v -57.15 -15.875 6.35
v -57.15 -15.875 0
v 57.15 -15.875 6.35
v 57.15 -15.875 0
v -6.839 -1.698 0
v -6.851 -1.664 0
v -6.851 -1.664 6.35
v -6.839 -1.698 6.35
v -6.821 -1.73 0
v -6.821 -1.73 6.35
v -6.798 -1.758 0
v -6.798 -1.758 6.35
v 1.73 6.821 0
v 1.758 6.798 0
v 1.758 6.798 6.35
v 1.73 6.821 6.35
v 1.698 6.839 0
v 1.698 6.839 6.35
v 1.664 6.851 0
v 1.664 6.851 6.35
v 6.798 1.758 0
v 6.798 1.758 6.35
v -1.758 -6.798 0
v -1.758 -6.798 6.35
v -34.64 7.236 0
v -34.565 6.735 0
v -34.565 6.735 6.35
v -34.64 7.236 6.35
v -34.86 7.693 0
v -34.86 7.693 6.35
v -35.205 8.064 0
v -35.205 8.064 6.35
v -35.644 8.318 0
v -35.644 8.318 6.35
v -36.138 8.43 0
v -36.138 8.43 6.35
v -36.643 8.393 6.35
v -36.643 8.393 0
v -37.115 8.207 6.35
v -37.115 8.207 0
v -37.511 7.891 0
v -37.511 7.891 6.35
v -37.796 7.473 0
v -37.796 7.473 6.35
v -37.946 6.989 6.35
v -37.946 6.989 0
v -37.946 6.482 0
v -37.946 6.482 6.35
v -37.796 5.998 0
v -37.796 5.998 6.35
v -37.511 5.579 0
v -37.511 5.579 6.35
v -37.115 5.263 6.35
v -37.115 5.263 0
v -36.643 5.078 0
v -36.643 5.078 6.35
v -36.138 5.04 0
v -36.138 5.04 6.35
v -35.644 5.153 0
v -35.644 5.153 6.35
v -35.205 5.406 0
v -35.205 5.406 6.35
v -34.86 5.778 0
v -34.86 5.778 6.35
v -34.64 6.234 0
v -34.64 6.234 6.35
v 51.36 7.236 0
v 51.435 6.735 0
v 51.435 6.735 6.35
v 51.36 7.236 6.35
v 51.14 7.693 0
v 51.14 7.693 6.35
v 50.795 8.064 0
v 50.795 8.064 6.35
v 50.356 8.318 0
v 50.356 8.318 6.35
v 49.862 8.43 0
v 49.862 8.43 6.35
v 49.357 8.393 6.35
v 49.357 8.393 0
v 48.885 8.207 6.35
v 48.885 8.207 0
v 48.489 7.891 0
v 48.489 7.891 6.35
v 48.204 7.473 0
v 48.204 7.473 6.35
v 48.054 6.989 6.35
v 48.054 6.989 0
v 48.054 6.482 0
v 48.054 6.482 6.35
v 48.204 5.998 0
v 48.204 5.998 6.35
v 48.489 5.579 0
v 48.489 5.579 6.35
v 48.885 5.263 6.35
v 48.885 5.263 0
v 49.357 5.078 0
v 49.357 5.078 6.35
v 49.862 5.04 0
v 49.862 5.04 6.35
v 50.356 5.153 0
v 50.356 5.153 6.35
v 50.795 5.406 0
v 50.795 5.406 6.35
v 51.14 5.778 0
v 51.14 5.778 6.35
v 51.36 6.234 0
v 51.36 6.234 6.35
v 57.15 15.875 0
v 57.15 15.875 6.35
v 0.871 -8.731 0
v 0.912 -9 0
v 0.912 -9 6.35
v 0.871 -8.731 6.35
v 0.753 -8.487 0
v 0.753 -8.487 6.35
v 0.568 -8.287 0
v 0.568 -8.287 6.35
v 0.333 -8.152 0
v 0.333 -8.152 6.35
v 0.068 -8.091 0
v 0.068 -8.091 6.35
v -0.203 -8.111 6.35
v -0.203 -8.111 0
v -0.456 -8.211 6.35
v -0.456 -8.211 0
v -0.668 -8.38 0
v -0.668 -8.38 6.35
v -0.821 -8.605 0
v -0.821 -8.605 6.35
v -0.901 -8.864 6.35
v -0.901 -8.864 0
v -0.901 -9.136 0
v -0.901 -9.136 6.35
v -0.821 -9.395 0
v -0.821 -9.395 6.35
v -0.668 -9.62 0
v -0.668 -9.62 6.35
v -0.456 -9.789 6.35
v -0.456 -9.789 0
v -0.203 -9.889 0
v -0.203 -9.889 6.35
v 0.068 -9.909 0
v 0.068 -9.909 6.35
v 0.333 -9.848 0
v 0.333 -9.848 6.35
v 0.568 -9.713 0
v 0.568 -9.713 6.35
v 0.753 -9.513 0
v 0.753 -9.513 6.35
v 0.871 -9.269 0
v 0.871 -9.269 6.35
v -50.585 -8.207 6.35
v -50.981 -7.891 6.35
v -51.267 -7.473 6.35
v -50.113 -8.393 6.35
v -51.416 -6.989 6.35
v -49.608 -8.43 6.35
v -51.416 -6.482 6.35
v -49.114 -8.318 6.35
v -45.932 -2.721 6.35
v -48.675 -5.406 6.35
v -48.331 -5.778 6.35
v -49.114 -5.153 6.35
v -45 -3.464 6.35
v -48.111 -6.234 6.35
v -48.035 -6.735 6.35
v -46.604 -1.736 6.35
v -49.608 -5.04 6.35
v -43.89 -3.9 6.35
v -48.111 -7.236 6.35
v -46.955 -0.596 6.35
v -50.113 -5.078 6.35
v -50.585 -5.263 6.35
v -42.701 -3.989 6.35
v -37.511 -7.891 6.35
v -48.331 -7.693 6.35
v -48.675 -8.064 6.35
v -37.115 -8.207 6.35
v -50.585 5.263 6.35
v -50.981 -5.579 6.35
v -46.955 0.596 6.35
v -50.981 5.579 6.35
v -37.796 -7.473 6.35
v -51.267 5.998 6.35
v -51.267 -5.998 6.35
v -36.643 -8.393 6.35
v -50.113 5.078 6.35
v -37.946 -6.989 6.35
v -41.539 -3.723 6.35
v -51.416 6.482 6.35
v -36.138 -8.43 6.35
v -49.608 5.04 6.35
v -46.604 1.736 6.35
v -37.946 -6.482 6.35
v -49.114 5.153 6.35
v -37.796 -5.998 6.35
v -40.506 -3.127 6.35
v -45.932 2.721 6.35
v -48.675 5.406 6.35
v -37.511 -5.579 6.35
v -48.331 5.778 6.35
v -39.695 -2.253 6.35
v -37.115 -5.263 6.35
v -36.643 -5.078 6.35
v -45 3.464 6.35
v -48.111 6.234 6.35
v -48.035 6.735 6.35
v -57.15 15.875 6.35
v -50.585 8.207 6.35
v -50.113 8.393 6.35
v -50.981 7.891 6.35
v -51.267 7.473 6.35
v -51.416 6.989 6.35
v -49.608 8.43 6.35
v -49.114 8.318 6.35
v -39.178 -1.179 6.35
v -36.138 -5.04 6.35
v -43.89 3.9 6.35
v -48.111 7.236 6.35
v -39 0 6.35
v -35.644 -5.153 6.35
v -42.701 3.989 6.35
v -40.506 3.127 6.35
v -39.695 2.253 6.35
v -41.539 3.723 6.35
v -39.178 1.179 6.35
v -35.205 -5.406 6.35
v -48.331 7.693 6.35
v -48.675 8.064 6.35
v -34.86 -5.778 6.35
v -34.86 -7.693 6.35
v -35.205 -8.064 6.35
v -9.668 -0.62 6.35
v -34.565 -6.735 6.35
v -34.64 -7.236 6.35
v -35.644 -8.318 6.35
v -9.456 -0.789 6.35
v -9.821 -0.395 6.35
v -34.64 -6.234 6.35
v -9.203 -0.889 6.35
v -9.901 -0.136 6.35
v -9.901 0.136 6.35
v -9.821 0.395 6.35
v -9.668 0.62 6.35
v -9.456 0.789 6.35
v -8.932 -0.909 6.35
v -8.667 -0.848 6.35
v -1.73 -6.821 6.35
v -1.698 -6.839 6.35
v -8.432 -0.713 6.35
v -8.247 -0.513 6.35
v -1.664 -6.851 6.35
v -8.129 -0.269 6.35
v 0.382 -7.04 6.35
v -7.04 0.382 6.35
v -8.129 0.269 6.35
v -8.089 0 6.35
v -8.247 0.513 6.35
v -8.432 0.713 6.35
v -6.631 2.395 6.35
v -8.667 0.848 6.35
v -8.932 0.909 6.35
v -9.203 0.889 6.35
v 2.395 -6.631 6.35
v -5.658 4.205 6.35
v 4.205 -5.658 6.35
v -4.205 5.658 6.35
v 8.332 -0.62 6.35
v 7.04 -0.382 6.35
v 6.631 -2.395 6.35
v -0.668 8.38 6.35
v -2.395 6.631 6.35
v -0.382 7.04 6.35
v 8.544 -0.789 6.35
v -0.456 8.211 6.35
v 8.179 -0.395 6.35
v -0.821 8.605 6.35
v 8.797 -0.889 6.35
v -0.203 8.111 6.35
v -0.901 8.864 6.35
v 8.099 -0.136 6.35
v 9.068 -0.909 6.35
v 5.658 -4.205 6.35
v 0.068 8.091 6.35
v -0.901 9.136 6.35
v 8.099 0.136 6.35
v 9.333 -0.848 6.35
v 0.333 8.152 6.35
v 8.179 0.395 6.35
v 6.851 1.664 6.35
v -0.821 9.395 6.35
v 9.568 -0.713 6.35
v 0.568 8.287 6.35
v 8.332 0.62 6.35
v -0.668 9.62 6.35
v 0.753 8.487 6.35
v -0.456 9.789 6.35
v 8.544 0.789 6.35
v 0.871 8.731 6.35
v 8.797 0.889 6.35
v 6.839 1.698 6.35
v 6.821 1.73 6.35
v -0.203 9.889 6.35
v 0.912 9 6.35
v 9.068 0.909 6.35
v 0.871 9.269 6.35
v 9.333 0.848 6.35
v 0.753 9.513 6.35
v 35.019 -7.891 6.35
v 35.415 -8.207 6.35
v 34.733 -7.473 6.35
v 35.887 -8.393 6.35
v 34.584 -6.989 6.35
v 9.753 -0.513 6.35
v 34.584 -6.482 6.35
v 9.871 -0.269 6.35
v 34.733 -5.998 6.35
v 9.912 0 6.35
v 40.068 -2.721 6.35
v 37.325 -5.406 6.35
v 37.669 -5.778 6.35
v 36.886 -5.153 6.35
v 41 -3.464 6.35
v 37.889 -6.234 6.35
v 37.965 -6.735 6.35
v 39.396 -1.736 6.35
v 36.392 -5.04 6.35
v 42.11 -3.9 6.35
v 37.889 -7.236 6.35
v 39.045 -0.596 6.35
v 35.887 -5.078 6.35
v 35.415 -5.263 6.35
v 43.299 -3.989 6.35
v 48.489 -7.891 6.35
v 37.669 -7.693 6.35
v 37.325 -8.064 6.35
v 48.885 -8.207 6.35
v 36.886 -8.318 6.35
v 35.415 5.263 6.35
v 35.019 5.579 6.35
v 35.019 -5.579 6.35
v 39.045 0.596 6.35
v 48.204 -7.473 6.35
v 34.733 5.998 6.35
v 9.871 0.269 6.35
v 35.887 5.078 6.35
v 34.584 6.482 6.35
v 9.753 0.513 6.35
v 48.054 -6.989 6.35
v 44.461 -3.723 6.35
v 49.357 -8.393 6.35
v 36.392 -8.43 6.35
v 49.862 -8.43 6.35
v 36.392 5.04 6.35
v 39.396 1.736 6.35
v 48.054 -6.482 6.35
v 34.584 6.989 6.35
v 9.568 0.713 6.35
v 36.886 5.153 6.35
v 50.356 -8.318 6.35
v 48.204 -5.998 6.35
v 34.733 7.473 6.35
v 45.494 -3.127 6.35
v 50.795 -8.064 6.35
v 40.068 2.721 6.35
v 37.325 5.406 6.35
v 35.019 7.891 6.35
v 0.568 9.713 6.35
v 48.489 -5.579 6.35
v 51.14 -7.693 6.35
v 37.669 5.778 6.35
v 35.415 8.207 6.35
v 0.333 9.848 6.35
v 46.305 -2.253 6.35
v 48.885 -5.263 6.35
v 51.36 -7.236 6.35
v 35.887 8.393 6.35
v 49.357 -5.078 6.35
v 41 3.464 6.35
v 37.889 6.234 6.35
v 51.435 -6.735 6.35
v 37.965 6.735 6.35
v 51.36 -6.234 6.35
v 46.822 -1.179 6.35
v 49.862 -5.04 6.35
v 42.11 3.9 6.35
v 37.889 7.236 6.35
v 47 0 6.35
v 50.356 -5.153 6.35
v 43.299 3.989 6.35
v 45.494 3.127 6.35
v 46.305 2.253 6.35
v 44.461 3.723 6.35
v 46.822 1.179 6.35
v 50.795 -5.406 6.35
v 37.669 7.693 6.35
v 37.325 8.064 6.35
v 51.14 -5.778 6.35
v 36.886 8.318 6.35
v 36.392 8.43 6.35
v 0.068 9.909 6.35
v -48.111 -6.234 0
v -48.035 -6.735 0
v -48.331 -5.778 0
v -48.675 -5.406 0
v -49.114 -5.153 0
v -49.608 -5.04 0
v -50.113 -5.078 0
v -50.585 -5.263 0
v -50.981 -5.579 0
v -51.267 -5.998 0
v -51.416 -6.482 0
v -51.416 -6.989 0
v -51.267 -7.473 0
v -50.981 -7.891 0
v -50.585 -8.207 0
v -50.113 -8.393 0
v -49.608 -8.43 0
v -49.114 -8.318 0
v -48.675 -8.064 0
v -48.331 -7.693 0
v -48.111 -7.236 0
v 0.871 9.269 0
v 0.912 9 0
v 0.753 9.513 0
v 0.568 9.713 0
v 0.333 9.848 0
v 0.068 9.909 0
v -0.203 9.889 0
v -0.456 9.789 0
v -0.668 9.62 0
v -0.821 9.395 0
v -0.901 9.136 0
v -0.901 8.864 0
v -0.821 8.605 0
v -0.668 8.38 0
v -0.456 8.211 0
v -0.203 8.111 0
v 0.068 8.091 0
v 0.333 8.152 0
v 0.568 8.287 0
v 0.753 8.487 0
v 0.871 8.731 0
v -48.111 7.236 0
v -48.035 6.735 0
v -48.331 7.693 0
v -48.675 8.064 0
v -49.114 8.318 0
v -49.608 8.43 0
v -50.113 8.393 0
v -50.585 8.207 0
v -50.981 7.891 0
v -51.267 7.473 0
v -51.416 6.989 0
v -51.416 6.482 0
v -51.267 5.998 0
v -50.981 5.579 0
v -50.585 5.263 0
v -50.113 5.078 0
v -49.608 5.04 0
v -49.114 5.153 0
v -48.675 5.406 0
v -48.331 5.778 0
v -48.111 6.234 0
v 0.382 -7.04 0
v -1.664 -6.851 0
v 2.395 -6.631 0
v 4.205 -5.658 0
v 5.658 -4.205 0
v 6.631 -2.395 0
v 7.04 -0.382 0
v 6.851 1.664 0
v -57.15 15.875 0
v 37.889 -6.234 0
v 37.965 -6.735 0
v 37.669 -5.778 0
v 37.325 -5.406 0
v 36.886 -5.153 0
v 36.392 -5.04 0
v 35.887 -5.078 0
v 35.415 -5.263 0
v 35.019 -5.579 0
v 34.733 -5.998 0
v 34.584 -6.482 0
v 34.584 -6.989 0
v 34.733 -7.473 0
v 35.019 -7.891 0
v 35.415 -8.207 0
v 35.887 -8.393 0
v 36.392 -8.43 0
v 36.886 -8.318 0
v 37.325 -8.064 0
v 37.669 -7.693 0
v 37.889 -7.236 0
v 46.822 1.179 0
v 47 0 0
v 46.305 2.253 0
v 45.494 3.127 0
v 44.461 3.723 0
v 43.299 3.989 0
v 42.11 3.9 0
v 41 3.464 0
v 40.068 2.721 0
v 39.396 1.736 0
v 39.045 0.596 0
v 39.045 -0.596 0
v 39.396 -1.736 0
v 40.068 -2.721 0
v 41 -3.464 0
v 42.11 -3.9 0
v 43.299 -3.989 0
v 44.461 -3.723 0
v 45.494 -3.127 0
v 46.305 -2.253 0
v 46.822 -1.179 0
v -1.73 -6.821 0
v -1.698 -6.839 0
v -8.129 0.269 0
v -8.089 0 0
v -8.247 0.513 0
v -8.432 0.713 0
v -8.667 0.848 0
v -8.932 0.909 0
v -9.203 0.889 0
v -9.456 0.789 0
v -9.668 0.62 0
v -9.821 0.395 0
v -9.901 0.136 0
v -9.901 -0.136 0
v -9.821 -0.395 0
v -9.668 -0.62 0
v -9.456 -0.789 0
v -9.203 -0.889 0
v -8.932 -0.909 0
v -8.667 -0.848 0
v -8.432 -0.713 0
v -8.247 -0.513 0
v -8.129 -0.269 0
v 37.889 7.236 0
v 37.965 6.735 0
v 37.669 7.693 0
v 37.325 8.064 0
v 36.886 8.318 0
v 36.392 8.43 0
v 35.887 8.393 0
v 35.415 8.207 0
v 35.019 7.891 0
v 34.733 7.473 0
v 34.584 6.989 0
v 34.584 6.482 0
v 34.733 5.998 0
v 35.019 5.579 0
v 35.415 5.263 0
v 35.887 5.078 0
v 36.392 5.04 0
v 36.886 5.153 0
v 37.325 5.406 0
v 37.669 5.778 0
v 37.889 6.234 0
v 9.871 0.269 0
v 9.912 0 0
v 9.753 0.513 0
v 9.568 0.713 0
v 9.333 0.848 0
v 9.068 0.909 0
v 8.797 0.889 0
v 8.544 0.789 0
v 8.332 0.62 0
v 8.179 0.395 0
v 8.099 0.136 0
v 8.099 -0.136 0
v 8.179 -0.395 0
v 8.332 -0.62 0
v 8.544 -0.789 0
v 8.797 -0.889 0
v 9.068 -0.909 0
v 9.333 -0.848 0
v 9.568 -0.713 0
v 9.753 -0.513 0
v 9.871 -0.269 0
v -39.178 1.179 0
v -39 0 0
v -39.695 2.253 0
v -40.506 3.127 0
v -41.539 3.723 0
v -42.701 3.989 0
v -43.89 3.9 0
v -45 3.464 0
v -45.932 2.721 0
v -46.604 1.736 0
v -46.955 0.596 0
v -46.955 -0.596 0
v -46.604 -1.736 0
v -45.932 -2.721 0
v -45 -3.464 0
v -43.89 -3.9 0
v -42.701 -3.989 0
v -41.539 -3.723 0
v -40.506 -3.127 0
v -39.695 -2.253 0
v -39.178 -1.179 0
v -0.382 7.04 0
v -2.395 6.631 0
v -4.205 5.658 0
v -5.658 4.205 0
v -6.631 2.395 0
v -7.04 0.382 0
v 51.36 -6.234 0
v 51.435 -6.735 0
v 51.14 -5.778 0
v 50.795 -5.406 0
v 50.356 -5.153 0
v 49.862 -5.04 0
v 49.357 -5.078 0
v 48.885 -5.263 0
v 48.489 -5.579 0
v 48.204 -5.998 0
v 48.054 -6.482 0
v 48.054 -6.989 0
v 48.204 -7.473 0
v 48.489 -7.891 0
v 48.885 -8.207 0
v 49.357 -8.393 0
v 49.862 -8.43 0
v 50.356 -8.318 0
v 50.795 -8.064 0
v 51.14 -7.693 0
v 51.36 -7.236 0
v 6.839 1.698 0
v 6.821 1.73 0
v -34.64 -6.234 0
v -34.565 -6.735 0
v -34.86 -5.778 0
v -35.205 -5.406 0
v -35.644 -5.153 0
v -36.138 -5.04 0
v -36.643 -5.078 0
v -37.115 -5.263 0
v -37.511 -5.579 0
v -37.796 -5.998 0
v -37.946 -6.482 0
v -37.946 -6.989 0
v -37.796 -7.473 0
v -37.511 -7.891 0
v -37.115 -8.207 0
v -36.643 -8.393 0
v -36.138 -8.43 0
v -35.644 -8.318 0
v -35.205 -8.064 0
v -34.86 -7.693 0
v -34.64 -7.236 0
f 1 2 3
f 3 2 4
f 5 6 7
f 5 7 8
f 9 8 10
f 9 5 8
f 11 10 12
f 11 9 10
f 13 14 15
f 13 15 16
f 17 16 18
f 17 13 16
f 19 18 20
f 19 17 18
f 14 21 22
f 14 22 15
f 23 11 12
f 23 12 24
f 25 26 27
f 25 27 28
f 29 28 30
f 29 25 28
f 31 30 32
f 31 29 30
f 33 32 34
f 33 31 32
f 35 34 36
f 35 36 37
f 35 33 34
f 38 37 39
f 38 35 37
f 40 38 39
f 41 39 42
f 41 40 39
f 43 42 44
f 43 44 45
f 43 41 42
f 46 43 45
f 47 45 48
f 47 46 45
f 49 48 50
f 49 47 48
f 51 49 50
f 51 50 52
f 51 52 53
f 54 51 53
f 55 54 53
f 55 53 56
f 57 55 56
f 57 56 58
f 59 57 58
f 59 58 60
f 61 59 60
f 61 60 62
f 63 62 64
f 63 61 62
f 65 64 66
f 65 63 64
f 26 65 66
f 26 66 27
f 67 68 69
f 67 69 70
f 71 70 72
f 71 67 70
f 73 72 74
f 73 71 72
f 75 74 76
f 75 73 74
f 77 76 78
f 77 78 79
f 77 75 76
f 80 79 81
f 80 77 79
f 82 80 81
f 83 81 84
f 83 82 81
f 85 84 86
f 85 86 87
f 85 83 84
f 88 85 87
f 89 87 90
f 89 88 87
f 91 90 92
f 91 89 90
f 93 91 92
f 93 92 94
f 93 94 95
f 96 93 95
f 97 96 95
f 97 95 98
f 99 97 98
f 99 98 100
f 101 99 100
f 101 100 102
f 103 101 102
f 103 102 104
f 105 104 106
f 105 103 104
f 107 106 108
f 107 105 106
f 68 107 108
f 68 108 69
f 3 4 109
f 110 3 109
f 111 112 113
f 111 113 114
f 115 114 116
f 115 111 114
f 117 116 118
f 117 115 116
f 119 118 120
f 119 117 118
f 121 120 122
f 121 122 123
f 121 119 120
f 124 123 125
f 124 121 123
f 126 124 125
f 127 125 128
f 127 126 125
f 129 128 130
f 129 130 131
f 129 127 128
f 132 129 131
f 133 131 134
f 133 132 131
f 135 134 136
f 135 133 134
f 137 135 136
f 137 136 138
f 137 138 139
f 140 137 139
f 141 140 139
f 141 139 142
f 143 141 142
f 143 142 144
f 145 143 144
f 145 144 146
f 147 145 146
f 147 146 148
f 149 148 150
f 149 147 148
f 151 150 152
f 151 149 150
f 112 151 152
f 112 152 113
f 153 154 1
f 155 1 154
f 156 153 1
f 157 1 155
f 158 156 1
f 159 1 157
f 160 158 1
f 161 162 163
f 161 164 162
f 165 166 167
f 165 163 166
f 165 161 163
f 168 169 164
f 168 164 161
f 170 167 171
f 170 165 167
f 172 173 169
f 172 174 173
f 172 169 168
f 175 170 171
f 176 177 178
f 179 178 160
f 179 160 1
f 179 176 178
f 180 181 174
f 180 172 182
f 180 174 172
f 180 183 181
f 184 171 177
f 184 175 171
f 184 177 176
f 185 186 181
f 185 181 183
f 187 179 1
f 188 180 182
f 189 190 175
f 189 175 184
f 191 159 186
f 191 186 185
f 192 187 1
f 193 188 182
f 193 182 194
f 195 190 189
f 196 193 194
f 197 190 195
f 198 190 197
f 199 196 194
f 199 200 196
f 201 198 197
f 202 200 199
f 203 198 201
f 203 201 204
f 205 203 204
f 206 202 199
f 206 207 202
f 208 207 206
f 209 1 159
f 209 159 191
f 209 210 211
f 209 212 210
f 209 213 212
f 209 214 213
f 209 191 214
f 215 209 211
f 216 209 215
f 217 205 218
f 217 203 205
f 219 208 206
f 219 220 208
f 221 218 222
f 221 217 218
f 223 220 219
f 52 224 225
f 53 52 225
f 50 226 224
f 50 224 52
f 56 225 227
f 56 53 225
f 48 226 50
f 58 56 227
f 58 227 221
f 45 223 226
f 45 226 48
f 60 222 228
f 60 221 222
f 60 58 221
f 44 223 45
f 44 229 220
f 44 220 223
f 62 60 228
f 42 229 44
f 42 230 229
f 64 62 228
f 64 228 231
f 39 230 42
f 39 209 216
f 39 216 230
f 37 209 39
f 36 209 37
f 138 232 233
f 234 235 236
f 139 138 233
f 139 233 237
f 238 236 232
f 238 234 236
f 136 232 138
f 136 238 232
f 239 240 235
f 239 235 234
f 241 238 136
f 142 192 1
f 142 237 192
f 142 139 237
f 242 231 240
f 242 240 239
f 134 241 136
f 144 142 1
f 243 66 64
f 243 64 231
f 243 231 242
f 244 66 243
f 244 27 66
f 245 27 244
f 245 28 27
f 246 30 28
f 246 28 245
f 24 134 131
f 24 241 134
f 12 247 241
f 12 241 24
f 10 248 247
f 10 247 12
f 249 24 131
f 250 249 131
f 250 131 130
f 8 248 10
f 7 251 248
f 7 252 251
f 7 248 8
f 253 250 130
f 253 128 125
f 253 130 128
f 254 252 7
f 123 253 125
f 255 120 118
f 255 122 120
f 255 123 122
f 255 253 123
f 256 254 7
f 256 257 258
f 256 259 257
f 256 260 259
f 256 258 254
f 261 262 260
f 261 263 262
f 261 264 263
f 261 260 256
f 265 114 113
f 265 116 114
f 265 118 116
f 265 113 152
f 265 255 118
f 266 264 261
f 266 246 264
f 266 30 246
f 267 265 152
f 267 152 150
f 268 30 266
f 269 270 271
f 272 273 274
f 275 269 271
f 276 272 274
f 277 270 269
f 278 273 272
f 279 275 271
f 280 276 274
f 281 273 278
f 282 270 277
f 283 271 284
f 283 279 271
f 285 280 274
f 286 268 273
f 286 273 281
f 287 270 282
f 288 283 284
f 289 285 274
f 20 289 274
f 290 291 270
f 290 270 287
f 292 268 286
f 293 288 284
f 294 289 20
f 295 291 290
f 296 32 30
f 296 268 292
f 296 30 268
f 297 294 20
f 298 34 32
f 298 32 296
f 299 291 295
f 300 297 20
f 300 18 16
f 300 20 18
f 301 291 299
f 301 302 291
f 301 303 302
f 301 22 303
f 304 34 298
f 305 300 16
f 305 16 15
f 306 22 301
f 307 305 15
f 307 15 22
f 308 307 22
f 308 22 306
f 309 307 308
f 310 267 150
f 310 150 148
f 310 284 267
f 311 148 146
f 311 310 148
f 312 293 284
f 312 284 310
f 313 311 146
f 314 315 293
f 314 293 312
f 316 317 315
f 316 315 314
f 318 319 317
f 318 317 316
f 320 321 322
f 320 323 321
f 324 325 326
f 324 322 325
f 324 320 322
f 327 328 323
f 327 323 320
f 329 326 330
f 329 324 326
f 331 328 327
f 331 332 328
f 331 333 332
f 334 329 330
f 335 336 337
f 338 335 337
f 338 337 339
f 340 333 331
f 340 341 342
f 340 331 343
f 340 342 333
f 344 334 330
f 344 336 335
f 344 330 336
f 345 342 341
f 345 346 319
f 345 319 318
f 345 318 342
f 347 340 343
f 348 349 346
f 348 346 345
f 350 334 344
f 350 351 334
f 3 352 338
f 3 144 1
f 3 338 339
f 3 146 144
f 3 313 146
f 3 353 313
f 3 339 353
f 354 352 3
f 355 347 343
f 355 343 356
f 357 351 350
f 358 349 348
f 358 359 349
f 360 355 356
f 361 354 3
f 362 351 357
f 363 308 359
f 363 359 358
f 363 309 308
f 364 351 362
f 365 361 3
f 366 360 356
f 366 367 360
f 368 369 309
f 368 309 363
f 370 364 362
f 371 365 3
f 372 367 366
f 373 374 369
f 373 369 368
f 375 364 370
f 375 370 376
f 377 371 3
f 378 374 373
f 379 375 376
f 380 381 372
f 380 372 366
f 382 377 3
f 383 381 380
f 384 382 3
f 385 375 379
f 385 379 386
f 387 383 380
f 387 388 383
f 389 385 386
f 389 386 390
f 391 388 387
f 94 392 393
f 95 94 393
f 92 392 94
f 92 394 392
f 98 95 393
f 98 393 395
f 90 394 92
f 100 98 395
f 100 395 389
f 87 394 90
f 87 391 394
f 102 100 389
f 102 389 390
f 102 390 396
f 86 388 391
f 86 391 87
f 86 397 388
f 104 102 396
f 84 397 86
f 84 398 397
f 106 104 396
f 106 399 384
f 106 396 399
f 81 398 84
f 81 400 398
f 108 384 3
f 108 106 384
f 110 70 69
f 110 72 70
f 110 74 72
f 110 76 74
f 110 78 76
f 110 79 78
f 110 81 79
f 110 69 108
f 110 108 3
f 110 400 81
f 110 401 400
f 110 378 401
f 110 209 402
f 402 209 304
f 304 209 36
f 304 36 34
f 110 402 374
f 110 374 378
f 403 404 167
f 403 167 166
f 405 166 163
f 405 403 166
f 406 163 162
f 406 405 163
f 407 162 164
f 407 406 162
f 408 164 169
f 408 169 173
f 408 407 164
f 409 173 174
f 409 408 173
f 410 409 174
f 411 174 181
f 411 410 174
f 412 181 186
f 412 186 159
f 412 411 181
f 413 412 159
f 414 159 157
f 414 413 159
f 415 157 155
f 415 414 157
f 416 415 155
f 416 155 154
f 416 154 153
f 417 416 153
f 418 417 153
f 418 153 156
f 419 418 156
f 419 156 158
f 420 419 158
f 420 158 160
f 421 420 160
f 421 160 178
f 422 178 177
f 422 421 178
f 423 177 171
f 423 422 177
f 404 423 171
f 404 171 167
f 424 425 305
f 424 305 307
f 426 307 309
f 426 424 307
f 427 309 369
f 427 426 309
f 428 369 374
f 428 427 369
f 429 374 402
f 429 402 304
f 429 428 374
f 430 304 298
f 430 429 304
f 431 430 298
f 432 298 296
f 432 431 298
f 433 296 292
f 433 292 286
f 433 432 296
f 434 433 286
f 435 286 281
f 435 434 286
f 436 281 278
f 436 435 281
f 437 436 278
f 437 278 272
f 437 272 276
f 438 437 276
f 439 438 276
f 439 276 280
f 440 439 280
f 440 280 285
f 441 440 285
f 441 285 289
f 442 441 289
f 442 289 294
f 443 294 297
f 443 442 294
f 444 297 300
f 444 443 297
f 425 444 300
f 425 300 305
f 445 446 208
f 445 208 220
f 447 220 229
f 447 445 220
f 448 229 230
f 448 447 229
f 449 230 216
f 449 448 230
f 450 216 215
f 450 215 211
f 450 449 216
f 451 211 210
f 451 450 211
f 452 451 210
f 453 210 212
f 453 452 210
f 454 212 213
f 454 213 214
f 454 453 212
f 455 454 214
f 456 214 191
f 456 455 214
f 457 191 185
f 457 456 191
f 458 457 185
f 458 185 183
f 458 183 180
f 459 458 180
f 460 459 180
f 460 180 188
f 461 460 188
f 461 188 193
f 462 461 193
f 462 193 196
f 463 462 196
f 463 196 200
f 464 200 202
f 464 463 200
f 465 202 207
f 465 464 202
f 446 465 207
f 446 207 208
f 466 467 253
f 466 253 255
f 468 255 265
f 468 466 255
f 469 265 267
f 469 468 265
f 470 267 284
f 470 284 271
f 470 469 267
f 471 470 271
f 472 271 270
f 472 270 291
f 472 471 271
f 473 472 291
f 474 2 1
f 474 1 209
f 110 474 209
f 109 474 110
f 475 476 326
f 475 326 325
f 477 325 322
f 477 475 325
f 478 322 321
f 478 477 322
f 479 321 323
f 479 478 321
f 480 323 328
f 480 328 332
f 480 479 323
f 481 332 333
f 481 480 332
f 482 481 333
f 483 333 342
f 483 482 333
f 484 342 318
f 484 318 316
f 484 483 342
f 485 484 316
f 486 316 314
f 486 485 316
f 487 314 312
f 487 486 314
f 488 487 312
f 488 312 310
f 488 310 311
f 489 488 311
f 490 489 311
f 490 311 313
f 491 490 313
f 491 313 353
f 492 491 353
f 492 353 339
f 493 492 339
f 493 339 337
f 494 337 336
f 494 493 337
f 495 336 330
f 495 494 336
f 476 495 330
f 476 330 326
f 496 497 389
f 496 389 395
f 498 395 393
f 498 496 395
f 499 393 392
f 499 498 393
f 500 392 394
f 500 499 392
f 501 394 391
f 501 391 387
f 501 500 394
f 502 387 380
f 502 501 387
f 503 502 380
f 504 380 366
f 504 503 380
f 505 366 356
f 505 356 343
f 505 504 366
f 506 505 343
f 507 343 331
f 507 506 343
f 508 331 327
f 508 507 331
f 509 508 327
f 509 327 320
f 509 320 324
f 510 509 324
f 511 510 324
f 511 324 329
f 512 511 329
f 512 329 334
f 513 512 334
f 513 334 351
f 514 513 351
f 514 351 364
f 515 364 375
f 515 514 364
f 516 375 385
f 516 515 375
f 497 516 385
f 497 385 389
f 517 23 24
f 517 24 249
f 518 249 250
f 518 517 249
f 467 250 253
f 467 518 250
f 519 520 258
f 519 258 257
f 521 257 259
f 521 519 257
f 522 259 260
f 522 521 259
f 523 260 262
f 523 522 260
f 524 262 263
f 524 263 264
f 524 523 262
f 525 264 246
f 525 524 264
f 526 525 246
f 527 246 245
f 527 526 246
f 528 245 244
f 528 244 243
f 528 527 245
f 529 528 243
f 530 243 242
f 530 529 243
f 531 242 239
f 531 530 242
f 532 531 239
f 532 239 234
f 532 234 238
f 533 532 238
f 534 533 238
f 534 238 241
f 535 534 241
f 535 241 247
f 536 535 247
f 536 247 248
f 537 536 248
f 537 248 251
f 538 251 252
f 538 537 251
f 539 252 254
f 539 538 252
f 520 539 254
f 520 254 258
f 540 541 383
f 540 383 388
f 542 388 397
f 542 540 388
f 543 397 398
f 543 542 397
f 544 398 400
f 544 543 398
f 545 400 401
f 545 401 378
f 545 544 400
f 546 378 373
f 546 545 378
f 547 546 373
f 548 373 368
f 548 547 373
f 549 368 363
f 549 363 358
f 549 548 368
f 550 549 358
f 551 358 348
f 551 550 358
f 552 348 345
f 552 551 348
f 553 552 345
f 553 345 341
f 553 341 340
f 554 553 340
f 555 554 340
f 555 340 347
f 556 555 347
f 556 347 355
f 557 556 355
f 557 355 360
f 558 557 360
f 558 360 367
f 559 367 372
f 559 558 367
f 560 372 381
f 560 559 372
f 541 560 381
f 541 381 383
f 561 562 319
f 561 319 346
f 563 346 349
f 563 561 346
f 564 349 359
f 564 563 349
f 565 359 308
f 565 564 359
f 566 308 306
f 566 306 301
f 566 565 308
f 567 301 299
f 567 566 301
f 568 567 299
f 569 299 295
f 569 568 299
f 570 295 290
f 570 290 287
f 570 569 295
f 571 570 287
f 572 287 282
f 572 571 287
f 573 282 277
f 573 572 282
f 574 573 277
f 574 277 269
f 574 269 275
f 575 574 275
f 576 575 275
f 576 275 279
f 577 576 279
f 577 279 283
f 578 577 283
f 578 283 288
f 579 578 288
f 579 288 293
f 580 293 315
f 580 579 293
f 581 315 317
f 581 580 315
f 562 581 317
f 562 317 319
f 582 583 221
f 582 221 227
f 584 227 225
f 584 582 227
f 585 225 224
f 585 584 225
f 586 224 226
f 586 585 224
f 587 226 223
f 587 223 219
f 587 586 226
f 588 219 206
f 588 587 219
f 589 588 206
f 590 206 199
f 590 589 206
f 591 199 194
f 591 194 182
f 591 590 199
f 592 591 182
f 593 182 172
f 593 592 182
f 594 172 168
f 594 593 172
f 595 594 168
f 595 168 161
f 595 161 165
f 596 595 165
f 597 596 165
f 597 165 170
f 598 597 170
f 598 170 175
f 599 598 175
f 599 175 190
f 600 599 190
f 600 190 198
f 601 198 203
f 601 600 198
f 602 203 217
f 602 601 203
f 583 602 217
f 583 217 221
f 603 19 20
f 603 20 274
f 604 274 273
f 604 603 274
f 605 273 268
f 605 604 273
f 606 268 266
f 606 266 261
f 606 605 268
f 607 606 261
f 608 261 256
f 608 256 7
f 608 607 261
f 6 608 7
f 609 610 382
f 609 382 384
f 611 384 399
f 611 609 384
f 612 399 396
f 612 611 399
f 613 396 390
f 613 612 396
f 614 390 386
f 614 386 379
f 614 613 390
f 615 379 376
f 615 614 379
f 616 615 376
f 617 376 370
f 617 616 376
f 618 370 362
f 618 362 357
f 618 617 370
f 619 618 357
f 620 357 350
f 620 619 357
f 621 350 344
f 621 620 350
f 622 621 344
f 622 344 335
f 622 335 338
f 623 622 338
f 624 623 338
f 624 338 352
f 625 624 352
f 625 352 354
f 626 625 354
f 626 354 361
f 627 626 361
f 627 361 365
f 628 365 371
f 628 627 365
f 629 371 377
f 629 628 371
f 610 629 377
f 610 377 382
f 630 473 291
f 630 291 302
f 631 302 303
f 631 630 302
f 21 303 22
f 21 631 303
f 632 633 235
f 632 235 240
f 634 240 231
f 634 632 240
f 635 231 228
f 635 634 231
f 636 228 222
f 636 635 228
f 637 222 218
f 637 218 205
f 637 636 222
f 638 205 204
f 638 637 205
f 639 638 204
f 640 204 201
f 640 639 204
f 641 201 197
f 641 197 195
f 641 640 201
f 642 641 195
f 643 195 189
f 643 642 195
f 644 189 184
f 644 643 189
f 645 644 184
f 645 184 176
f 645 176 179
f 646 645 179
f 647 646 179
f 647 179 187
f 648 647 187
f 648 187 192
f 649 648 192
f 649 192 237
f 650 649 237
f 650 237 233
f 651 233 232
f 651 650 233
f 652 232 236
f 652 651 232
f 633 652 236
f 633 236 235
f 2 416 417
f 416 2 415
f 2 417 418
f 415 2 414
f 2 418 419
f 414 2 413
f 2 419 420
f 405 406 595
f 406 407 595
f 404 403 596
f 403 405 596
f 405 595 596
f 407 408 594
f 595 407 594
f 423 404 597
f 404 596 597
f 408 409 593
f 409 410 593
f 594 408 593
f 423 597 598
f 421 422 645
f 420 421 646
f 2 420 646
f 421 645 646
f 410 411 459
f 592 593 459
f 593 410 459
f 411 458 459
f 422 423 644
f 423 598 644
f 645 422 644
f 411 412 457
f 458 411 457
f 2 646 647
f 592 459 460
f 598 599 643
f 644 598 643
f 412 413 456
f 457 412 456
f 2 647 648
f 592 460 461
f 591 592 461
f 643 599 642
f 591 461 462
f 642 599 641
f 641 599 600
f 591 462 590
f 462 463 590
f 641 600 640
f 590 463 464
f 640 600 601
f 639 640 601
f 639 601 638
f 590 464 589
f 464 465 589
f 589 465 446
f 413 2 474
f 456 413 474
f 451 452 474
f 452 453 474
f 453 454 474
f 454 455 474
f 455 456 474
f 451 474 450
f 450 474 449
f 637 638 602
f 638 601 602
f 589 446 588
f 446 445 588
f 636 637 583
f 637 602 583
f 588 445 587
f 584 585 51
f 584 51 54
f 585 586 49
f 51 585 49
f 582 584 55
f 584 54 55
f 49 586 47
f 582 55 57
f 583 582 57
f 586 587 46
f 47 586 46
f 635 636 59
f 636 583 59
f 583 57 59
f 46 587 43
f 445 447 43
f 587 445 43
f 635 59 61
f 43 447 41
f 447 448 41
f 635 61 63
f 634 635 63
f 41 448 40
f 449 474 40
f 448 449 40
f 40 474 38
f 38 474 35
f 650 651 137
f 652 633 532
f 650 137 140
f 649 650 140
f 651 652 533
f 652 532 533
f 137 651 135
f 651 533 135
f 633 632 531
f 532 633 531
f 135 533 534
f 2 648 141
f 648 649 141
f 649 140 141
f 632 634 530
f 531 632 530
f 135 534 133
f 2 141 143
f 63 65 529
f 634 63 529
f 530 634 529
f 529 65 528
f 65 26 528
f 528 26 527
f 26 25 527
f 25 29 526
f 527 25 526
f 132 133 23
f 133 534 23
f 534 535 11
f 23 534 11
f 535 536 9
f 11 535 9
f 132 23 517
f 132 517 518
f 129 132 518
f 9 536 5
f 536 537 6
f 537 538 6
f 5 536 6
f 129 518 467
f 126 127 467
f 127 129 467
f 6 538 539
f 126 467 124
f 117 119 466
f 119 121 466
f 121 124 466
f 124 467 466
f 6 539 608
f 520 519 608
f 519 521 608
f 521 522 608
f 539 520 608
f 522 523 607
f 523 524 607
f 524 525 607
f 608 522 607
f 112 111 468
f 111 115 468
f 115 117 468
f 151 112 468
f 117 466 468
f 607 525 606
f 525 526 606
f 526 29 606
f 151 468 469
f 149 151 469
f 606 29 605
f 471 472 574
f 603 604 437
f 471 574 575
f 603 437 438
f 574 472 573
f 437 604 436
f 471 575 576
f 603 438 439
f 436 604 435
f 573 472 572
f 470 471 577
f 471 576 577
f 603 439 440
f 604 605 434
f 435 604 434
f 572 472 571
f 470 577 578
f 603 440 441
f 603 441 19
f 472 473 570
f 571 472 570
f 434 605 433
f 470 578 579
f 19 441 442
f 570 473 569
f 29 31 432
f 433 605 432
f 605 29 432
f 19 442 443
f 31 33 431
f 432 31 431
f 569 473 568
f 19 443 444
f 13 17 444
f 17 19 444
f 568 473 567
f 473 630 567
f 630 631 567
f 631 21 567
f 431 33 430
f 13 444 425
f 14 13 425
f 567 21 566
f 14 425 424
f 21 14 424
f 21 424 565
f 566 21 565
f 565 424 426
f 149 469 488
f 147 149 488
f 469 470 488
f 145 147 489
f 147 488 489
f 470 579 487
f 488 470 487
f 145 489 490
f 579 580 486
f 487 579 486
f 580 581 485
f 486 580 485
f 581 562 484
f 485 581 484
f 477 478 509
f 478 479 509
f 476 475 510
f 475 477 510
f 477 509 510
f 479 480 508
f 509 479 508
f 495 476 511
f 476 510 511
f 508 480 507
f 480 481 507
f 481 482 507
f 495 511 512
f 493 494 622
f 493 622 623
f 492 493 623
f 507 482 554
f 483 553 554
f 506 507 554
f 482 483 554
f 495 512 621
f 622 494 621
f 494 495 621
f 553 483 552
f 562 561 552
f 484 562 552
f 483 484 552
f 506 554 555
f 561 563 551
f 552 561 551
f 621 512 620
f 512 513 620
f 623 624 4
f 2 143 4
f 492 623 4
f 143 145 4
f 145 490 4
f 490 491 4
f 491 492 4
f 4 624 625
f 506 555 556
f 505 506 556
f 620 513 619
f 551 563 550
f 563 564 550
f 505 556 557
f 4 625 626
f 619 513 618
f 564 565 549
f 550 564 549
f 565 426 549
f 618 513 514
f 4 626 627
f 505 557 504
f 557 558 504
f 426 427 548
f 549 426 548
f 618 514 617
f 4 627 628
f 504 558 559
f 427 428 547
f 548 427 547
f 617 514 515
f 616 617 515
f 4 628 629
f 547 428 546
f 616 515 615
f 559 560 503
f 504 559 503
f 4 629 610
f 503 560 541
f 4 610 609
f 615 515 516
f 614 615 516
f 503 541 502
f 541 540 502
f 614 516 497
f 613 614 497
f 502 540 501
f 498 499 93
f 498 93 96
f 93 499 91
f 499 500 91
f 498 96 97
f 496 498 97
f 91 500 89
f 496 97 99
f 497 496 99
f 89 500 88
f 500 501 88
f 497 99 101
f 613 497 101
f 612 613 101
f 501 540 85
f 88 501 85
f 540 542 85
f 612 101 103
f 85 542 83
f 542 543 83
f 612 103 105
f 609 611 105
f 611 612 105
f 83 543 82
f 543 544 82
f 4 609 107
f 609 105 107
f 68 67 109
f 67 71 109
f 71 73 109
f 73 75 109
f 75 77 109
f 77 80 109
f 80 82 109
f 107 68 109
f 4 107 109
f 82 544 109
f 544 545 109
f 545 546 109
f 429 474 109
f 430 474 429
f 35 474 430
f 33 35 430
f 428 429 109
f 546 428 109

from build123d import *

# Parameters (mm, degrees)
SKETCH1_W           = 114.3
SKETCH1_H           = 31.75
SKETCH1_R           = 0.9115
SKETCH1_R_2         = 4
SKETCH1_R_3         = 1.7
BOSS_EXTRUDE1_DEPTH = 6.35


with BuildPart() as part:
    # Sketch1 → Boss-Extrude1 (new body)
    with BuildSketch(Plane.XY):
        Rectangle(SKETCH1_W, SKETCH1_H)
        with Locations((-9.000000134, 0)):
            Circle(SKETCH1_R, mode=Mode.SUBTRACT)
        with Locations((0, -9.000000134)):
            Circle(SKETCH1_R, mode=Mode.SUBTRACT)
        with Locations((9.000000134, 0)):
            Circle(SKETCH1_R, mode=Mode.SUBTRACT)
        with Locations((0, 9.000000134)):
            Circle(SKETCH1_R, mode=Mode.SUBTRACT)
        with Locations((-43.000000106, 0)):
            Circle(SKETCH1_R_2, mode=Mode.SUBTRACT)
        with Locations((43.000000106, 0)):
            Circle(SKETCH1_R_2, mode=Mode.SUBTRACT)
        with Locations((-36.264808015, 6.735192091)):
            Circle(SKETCH1_R_3, mode=Mode.SUBTRACT)
        with Locations((-49.735192197, 6.735192091)):
            Circle(SKETCH1_R_3, mode=Mode.SUBTRACT)
        with Locations((-36.264808015, -6.735192091)):
            Circle(SKETCH1_R_3, mode=Mode.SUBTRACT)
        with Locations((-49.735192197, -6.735192091)):
            Circle(SKETCH1_R_3, mode=Mode.SUBTRACT)
        with Locations((49.735192197, -6.735192091)):
            Circle(SKETCH1_R_3, mode=Mode.SUBTRACT)
        with Locations((36.264808015, -6.735192091)):
            Circle(SKETCH1_R_3, mode=Mode.SUBTRACT)
        with Locations((36.264808015, 6.735192091)):
            Circle(SKETCH1_R_3, mode=Mode.SUBTRACT)
        with Locations((49.735192197, 6.735192091)):
            Circle(SKETCH1_R_3, mode=Mode.SUBTRACT)
        with BuildLine():
            Line((-6.79791666, -1.758075393), (-1.758075393, -6.79791666))
            ThreePointArc((-1.758075393, -6.79791666), (-1.714608205, -6.830865544), (-1.663855614, -6.850845531))
            ThreePointArc((-1.663855614, -6.850845531), (4.985102807, -4.985102807), (6.850845531, 1.663855614))
            ThreePointArc((6.850845531, 1.663855614), (6.830865544, 1.714608205), (6.79791666, 1.758075393))
            Line((6.79791666, 1.758075393), (1.758075393, 6.79791666))
            ThreePointArc((1.758075393, 6.79791666), (1.714608205, 6.830865544), (1.663855614, 6.850845531))
            ThreePointArc((1.663855614, 6.850845531), (-4.985102807, 4.985102807), (-6.850845531, -1.663855614))
            ThreePointArc((-6.850845531, -1.663855614), (-6.830865544, -1.714608205), (-6.79791666, -1.758075393))
        make_face(mode=Mode.SUBTRACT)
    extrude(amount=BOSS_EXTRUDE1_DEPTH)


solid = part.part
